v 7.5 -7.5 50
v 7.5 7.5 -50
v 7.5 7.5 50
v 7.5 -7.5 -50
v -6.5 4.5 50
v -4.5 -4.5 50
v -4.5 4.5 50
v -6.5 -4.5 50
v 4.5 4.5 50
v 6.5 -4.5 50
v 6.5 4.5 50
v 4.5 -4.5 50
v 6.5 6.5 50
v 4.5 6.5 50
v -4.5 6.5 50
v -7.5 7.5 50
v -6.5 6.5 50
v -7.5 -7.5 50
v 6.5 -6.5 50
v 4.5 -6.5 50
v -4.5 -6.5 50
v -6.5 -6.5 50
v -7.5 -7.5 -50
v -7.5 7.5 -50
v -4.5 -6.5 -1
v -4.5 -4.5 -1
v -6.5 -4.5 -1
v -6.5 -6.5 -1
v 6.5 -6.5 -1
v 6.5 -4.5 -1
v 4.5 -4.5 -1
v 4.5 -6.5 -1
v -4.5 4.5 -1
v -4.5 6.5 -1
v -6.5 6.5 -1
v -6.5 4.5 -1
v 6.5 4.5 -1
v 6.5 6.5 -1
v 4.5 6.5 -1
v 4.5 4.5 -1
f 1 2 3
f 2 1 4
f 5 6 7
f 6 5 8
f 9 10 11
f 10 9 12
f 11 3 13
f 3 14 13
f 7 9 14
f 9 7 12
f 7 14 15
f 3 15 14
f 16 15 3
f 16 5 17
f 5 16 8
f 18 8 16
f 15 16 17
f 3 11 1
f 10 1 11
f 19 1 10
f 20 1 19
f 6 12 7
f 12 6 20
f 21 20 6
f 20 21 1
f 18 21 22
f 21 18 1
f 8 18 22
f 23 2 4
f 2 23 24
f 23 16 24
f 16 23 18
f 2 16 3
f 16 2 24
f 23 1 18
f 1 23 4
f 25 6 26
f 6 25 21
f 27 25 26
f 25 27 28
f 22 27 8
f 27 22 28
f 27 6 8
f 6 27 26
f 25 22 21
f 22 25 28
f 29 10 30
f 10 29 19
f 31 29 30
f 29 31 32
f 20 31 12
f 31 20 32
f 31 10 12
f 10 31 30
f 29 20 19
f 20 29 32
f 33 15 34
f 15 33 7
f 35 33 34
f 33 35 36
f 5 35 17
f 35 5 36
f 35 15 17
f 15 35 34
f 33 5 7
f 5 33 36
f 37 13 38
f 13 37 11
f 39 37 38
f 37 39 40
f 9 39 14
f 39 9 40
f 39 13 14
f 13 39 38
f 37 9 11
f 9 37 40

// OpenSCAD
module aluminium_extrusion() {
    difference() {
        cube([15, 15, 100], center = true);
        translate([-6.5, -6.5, -1])
            cube([2, 2, 102], center = false);
        translate([4.5, -6.5, -1])
            cube([2, 2, 102], center = false);
        translate([-6.5, 4.5, -1])
            cube([2, 2, 102], center = false);
        translate([4.5, 4.5, -1])
            cube([2, 2, 102], center = false);
    }
}

aluminium_extrusion();
